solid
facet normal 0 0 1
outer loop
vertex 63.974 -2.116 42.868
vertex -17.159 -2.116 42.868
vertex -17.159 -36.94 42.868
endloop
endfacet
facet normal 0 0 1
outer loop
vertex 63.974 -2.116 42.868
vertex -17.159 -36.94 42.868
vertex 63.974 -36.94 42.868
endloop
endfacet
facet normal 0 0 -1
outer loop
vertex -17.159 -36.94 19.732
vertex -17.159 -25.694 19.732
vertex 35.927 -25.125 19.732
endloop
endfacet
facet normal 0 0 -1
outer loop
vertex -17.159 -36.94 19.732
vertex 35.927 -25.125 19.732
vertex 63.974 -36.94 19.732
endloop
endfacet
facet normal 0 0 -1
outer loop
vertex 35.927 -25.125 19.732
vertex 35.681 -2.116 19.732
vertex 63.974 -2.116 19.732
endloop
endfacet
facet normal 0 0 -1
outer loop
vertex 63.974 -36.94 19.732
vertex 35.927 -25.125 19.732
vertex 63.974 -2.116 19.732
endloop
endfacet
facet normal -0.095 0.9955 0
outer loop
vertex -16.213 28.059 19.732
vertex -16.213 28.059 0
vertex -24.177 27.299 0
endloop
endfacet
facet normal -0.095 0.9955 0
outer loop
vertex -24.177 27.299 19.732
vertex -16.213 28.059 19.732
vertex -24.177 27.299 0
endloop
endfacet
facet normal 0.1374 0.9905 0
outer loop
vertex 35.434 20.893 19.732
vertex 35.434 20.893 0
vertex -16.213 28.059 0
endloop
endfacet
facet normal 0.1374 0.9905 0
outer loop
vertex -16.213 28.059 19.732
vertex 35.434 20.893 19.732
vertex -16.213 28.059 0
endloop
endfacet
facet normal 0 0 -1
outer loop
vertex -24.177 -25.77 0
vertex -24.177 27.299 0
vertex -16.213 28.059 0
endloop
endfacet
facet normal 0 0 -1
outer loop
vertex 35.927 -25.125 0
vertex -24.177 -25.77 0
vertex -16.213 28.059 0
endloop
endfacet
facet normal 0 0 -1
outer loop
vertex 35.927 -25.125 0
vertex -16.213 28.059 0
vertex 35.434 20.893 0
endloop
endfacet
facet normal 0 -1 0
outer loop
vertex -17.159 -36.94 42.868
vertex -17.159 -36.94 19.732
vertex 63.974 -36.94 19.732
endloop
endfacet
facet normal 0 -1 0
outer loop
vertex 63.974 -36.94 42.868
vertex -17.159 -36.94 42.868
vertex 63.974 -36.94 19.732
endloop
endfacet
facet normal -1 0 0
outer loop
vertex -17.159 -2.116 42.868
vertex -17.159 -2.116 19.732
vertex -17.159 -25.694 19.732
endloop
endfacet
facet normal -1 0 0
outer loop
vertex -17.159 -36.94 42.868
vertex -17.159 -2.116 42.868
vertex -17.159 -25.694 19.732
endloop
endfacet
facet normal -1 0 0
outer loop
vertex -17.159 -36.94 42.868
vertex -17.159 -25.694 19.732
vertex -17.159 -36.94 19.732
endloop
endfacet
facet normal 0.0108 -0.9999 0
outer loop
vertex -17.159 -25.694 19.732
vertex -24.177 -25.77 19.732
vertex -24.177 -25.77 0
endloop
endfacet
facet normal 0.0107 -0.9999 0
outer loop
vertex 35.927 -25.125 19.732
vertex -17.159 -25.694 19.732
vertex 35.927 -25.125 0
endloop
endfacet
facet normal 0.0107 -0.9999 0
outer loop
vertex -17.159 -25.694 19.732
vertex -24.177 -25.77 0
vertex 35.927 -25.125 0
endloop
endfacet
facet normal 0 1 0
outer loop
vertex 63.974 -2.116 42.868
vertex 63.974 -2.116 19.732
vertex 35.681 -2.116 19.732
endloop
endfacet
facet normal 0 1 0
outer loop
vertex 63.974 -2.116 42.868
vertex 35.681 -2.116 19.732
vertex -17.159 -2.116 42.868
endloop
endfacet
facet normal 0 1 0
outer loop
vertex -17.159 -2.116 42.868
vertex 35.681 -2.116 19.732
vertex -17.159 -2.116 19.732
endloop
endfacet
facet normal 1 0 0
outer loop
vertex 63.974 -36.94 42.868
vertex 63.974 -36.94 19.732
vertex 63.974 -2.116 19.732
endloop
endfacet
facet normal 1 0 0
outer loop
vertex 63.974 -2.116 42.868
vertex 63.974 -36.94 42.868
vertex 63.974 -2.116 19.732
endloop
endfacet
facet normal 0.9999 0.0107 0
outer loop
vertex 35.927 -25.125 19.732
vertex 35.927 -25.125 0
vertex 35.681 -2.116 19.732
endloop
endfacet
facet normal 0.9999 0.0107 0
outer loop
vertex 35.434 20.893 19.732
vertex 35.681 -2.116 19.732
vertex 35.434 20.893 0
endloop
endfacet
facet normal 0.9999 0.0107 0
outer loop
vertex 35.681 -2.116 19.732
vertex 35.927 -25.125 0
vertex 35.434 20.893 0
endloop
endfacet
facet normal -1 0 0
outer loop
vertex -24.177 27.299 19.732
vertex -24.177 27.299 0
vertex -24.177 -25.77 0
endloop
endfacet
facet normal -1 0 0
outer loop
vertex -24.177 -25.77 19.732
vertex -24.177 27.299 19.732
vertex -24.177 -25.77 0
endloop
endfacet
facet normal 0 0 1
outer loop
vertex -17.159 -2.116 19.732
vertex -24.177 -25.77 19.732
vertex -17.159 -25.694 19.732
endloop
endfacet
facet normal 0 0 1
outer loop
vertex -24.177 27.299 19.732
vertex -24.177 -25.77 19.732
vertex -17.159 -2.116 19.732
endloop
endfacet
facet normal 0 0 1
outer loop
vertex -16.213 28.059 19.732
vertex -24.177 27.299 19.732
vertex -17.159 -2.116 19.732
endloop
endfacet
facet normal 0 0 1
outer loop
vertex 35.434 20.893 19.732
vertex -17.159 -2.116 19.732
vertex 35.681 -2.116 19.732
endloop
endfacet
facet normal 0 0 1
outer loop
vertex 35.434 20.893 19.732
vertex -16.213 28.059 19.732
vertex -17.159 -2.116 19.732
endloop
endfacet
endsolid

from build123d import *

# Parameters (mm, degrees)
F1_DEPTH = 19.732377
F3_DEPTH = 23.135303


with BuildPart() as f1:
    # F0 (on Top) → F1 (new body)
    with BuildSketch(Plane.XY):
        Polygon((-16.213404, 28.059224), (-24.17749, 27.298637), (-24.17749, -25.769621), (35.927385, -25.125202), (35.433998, 20.8929), align=None)
    extrude(amount=F1_DEPTH)

    # F2 (on face) → F3 (join)
    with BuildSketch(Plane.XY.offset(19.732377)):
        Polygon((-17.158642, -2.116151), (-17.158642, -25.694368), (35.927385, -25.125202), (35.680692, -2.116151), align=None)
        Polygon((-17.158642, -25.694368), (-17.158642, -36.939867), (63.973717, -36.939867), (63.973717, -2.116151), (35.680692, -2.116151), (35.927385, -25.125202), align=None)
    extrude(amount=F3_DEPTH)


solid = f1.part
